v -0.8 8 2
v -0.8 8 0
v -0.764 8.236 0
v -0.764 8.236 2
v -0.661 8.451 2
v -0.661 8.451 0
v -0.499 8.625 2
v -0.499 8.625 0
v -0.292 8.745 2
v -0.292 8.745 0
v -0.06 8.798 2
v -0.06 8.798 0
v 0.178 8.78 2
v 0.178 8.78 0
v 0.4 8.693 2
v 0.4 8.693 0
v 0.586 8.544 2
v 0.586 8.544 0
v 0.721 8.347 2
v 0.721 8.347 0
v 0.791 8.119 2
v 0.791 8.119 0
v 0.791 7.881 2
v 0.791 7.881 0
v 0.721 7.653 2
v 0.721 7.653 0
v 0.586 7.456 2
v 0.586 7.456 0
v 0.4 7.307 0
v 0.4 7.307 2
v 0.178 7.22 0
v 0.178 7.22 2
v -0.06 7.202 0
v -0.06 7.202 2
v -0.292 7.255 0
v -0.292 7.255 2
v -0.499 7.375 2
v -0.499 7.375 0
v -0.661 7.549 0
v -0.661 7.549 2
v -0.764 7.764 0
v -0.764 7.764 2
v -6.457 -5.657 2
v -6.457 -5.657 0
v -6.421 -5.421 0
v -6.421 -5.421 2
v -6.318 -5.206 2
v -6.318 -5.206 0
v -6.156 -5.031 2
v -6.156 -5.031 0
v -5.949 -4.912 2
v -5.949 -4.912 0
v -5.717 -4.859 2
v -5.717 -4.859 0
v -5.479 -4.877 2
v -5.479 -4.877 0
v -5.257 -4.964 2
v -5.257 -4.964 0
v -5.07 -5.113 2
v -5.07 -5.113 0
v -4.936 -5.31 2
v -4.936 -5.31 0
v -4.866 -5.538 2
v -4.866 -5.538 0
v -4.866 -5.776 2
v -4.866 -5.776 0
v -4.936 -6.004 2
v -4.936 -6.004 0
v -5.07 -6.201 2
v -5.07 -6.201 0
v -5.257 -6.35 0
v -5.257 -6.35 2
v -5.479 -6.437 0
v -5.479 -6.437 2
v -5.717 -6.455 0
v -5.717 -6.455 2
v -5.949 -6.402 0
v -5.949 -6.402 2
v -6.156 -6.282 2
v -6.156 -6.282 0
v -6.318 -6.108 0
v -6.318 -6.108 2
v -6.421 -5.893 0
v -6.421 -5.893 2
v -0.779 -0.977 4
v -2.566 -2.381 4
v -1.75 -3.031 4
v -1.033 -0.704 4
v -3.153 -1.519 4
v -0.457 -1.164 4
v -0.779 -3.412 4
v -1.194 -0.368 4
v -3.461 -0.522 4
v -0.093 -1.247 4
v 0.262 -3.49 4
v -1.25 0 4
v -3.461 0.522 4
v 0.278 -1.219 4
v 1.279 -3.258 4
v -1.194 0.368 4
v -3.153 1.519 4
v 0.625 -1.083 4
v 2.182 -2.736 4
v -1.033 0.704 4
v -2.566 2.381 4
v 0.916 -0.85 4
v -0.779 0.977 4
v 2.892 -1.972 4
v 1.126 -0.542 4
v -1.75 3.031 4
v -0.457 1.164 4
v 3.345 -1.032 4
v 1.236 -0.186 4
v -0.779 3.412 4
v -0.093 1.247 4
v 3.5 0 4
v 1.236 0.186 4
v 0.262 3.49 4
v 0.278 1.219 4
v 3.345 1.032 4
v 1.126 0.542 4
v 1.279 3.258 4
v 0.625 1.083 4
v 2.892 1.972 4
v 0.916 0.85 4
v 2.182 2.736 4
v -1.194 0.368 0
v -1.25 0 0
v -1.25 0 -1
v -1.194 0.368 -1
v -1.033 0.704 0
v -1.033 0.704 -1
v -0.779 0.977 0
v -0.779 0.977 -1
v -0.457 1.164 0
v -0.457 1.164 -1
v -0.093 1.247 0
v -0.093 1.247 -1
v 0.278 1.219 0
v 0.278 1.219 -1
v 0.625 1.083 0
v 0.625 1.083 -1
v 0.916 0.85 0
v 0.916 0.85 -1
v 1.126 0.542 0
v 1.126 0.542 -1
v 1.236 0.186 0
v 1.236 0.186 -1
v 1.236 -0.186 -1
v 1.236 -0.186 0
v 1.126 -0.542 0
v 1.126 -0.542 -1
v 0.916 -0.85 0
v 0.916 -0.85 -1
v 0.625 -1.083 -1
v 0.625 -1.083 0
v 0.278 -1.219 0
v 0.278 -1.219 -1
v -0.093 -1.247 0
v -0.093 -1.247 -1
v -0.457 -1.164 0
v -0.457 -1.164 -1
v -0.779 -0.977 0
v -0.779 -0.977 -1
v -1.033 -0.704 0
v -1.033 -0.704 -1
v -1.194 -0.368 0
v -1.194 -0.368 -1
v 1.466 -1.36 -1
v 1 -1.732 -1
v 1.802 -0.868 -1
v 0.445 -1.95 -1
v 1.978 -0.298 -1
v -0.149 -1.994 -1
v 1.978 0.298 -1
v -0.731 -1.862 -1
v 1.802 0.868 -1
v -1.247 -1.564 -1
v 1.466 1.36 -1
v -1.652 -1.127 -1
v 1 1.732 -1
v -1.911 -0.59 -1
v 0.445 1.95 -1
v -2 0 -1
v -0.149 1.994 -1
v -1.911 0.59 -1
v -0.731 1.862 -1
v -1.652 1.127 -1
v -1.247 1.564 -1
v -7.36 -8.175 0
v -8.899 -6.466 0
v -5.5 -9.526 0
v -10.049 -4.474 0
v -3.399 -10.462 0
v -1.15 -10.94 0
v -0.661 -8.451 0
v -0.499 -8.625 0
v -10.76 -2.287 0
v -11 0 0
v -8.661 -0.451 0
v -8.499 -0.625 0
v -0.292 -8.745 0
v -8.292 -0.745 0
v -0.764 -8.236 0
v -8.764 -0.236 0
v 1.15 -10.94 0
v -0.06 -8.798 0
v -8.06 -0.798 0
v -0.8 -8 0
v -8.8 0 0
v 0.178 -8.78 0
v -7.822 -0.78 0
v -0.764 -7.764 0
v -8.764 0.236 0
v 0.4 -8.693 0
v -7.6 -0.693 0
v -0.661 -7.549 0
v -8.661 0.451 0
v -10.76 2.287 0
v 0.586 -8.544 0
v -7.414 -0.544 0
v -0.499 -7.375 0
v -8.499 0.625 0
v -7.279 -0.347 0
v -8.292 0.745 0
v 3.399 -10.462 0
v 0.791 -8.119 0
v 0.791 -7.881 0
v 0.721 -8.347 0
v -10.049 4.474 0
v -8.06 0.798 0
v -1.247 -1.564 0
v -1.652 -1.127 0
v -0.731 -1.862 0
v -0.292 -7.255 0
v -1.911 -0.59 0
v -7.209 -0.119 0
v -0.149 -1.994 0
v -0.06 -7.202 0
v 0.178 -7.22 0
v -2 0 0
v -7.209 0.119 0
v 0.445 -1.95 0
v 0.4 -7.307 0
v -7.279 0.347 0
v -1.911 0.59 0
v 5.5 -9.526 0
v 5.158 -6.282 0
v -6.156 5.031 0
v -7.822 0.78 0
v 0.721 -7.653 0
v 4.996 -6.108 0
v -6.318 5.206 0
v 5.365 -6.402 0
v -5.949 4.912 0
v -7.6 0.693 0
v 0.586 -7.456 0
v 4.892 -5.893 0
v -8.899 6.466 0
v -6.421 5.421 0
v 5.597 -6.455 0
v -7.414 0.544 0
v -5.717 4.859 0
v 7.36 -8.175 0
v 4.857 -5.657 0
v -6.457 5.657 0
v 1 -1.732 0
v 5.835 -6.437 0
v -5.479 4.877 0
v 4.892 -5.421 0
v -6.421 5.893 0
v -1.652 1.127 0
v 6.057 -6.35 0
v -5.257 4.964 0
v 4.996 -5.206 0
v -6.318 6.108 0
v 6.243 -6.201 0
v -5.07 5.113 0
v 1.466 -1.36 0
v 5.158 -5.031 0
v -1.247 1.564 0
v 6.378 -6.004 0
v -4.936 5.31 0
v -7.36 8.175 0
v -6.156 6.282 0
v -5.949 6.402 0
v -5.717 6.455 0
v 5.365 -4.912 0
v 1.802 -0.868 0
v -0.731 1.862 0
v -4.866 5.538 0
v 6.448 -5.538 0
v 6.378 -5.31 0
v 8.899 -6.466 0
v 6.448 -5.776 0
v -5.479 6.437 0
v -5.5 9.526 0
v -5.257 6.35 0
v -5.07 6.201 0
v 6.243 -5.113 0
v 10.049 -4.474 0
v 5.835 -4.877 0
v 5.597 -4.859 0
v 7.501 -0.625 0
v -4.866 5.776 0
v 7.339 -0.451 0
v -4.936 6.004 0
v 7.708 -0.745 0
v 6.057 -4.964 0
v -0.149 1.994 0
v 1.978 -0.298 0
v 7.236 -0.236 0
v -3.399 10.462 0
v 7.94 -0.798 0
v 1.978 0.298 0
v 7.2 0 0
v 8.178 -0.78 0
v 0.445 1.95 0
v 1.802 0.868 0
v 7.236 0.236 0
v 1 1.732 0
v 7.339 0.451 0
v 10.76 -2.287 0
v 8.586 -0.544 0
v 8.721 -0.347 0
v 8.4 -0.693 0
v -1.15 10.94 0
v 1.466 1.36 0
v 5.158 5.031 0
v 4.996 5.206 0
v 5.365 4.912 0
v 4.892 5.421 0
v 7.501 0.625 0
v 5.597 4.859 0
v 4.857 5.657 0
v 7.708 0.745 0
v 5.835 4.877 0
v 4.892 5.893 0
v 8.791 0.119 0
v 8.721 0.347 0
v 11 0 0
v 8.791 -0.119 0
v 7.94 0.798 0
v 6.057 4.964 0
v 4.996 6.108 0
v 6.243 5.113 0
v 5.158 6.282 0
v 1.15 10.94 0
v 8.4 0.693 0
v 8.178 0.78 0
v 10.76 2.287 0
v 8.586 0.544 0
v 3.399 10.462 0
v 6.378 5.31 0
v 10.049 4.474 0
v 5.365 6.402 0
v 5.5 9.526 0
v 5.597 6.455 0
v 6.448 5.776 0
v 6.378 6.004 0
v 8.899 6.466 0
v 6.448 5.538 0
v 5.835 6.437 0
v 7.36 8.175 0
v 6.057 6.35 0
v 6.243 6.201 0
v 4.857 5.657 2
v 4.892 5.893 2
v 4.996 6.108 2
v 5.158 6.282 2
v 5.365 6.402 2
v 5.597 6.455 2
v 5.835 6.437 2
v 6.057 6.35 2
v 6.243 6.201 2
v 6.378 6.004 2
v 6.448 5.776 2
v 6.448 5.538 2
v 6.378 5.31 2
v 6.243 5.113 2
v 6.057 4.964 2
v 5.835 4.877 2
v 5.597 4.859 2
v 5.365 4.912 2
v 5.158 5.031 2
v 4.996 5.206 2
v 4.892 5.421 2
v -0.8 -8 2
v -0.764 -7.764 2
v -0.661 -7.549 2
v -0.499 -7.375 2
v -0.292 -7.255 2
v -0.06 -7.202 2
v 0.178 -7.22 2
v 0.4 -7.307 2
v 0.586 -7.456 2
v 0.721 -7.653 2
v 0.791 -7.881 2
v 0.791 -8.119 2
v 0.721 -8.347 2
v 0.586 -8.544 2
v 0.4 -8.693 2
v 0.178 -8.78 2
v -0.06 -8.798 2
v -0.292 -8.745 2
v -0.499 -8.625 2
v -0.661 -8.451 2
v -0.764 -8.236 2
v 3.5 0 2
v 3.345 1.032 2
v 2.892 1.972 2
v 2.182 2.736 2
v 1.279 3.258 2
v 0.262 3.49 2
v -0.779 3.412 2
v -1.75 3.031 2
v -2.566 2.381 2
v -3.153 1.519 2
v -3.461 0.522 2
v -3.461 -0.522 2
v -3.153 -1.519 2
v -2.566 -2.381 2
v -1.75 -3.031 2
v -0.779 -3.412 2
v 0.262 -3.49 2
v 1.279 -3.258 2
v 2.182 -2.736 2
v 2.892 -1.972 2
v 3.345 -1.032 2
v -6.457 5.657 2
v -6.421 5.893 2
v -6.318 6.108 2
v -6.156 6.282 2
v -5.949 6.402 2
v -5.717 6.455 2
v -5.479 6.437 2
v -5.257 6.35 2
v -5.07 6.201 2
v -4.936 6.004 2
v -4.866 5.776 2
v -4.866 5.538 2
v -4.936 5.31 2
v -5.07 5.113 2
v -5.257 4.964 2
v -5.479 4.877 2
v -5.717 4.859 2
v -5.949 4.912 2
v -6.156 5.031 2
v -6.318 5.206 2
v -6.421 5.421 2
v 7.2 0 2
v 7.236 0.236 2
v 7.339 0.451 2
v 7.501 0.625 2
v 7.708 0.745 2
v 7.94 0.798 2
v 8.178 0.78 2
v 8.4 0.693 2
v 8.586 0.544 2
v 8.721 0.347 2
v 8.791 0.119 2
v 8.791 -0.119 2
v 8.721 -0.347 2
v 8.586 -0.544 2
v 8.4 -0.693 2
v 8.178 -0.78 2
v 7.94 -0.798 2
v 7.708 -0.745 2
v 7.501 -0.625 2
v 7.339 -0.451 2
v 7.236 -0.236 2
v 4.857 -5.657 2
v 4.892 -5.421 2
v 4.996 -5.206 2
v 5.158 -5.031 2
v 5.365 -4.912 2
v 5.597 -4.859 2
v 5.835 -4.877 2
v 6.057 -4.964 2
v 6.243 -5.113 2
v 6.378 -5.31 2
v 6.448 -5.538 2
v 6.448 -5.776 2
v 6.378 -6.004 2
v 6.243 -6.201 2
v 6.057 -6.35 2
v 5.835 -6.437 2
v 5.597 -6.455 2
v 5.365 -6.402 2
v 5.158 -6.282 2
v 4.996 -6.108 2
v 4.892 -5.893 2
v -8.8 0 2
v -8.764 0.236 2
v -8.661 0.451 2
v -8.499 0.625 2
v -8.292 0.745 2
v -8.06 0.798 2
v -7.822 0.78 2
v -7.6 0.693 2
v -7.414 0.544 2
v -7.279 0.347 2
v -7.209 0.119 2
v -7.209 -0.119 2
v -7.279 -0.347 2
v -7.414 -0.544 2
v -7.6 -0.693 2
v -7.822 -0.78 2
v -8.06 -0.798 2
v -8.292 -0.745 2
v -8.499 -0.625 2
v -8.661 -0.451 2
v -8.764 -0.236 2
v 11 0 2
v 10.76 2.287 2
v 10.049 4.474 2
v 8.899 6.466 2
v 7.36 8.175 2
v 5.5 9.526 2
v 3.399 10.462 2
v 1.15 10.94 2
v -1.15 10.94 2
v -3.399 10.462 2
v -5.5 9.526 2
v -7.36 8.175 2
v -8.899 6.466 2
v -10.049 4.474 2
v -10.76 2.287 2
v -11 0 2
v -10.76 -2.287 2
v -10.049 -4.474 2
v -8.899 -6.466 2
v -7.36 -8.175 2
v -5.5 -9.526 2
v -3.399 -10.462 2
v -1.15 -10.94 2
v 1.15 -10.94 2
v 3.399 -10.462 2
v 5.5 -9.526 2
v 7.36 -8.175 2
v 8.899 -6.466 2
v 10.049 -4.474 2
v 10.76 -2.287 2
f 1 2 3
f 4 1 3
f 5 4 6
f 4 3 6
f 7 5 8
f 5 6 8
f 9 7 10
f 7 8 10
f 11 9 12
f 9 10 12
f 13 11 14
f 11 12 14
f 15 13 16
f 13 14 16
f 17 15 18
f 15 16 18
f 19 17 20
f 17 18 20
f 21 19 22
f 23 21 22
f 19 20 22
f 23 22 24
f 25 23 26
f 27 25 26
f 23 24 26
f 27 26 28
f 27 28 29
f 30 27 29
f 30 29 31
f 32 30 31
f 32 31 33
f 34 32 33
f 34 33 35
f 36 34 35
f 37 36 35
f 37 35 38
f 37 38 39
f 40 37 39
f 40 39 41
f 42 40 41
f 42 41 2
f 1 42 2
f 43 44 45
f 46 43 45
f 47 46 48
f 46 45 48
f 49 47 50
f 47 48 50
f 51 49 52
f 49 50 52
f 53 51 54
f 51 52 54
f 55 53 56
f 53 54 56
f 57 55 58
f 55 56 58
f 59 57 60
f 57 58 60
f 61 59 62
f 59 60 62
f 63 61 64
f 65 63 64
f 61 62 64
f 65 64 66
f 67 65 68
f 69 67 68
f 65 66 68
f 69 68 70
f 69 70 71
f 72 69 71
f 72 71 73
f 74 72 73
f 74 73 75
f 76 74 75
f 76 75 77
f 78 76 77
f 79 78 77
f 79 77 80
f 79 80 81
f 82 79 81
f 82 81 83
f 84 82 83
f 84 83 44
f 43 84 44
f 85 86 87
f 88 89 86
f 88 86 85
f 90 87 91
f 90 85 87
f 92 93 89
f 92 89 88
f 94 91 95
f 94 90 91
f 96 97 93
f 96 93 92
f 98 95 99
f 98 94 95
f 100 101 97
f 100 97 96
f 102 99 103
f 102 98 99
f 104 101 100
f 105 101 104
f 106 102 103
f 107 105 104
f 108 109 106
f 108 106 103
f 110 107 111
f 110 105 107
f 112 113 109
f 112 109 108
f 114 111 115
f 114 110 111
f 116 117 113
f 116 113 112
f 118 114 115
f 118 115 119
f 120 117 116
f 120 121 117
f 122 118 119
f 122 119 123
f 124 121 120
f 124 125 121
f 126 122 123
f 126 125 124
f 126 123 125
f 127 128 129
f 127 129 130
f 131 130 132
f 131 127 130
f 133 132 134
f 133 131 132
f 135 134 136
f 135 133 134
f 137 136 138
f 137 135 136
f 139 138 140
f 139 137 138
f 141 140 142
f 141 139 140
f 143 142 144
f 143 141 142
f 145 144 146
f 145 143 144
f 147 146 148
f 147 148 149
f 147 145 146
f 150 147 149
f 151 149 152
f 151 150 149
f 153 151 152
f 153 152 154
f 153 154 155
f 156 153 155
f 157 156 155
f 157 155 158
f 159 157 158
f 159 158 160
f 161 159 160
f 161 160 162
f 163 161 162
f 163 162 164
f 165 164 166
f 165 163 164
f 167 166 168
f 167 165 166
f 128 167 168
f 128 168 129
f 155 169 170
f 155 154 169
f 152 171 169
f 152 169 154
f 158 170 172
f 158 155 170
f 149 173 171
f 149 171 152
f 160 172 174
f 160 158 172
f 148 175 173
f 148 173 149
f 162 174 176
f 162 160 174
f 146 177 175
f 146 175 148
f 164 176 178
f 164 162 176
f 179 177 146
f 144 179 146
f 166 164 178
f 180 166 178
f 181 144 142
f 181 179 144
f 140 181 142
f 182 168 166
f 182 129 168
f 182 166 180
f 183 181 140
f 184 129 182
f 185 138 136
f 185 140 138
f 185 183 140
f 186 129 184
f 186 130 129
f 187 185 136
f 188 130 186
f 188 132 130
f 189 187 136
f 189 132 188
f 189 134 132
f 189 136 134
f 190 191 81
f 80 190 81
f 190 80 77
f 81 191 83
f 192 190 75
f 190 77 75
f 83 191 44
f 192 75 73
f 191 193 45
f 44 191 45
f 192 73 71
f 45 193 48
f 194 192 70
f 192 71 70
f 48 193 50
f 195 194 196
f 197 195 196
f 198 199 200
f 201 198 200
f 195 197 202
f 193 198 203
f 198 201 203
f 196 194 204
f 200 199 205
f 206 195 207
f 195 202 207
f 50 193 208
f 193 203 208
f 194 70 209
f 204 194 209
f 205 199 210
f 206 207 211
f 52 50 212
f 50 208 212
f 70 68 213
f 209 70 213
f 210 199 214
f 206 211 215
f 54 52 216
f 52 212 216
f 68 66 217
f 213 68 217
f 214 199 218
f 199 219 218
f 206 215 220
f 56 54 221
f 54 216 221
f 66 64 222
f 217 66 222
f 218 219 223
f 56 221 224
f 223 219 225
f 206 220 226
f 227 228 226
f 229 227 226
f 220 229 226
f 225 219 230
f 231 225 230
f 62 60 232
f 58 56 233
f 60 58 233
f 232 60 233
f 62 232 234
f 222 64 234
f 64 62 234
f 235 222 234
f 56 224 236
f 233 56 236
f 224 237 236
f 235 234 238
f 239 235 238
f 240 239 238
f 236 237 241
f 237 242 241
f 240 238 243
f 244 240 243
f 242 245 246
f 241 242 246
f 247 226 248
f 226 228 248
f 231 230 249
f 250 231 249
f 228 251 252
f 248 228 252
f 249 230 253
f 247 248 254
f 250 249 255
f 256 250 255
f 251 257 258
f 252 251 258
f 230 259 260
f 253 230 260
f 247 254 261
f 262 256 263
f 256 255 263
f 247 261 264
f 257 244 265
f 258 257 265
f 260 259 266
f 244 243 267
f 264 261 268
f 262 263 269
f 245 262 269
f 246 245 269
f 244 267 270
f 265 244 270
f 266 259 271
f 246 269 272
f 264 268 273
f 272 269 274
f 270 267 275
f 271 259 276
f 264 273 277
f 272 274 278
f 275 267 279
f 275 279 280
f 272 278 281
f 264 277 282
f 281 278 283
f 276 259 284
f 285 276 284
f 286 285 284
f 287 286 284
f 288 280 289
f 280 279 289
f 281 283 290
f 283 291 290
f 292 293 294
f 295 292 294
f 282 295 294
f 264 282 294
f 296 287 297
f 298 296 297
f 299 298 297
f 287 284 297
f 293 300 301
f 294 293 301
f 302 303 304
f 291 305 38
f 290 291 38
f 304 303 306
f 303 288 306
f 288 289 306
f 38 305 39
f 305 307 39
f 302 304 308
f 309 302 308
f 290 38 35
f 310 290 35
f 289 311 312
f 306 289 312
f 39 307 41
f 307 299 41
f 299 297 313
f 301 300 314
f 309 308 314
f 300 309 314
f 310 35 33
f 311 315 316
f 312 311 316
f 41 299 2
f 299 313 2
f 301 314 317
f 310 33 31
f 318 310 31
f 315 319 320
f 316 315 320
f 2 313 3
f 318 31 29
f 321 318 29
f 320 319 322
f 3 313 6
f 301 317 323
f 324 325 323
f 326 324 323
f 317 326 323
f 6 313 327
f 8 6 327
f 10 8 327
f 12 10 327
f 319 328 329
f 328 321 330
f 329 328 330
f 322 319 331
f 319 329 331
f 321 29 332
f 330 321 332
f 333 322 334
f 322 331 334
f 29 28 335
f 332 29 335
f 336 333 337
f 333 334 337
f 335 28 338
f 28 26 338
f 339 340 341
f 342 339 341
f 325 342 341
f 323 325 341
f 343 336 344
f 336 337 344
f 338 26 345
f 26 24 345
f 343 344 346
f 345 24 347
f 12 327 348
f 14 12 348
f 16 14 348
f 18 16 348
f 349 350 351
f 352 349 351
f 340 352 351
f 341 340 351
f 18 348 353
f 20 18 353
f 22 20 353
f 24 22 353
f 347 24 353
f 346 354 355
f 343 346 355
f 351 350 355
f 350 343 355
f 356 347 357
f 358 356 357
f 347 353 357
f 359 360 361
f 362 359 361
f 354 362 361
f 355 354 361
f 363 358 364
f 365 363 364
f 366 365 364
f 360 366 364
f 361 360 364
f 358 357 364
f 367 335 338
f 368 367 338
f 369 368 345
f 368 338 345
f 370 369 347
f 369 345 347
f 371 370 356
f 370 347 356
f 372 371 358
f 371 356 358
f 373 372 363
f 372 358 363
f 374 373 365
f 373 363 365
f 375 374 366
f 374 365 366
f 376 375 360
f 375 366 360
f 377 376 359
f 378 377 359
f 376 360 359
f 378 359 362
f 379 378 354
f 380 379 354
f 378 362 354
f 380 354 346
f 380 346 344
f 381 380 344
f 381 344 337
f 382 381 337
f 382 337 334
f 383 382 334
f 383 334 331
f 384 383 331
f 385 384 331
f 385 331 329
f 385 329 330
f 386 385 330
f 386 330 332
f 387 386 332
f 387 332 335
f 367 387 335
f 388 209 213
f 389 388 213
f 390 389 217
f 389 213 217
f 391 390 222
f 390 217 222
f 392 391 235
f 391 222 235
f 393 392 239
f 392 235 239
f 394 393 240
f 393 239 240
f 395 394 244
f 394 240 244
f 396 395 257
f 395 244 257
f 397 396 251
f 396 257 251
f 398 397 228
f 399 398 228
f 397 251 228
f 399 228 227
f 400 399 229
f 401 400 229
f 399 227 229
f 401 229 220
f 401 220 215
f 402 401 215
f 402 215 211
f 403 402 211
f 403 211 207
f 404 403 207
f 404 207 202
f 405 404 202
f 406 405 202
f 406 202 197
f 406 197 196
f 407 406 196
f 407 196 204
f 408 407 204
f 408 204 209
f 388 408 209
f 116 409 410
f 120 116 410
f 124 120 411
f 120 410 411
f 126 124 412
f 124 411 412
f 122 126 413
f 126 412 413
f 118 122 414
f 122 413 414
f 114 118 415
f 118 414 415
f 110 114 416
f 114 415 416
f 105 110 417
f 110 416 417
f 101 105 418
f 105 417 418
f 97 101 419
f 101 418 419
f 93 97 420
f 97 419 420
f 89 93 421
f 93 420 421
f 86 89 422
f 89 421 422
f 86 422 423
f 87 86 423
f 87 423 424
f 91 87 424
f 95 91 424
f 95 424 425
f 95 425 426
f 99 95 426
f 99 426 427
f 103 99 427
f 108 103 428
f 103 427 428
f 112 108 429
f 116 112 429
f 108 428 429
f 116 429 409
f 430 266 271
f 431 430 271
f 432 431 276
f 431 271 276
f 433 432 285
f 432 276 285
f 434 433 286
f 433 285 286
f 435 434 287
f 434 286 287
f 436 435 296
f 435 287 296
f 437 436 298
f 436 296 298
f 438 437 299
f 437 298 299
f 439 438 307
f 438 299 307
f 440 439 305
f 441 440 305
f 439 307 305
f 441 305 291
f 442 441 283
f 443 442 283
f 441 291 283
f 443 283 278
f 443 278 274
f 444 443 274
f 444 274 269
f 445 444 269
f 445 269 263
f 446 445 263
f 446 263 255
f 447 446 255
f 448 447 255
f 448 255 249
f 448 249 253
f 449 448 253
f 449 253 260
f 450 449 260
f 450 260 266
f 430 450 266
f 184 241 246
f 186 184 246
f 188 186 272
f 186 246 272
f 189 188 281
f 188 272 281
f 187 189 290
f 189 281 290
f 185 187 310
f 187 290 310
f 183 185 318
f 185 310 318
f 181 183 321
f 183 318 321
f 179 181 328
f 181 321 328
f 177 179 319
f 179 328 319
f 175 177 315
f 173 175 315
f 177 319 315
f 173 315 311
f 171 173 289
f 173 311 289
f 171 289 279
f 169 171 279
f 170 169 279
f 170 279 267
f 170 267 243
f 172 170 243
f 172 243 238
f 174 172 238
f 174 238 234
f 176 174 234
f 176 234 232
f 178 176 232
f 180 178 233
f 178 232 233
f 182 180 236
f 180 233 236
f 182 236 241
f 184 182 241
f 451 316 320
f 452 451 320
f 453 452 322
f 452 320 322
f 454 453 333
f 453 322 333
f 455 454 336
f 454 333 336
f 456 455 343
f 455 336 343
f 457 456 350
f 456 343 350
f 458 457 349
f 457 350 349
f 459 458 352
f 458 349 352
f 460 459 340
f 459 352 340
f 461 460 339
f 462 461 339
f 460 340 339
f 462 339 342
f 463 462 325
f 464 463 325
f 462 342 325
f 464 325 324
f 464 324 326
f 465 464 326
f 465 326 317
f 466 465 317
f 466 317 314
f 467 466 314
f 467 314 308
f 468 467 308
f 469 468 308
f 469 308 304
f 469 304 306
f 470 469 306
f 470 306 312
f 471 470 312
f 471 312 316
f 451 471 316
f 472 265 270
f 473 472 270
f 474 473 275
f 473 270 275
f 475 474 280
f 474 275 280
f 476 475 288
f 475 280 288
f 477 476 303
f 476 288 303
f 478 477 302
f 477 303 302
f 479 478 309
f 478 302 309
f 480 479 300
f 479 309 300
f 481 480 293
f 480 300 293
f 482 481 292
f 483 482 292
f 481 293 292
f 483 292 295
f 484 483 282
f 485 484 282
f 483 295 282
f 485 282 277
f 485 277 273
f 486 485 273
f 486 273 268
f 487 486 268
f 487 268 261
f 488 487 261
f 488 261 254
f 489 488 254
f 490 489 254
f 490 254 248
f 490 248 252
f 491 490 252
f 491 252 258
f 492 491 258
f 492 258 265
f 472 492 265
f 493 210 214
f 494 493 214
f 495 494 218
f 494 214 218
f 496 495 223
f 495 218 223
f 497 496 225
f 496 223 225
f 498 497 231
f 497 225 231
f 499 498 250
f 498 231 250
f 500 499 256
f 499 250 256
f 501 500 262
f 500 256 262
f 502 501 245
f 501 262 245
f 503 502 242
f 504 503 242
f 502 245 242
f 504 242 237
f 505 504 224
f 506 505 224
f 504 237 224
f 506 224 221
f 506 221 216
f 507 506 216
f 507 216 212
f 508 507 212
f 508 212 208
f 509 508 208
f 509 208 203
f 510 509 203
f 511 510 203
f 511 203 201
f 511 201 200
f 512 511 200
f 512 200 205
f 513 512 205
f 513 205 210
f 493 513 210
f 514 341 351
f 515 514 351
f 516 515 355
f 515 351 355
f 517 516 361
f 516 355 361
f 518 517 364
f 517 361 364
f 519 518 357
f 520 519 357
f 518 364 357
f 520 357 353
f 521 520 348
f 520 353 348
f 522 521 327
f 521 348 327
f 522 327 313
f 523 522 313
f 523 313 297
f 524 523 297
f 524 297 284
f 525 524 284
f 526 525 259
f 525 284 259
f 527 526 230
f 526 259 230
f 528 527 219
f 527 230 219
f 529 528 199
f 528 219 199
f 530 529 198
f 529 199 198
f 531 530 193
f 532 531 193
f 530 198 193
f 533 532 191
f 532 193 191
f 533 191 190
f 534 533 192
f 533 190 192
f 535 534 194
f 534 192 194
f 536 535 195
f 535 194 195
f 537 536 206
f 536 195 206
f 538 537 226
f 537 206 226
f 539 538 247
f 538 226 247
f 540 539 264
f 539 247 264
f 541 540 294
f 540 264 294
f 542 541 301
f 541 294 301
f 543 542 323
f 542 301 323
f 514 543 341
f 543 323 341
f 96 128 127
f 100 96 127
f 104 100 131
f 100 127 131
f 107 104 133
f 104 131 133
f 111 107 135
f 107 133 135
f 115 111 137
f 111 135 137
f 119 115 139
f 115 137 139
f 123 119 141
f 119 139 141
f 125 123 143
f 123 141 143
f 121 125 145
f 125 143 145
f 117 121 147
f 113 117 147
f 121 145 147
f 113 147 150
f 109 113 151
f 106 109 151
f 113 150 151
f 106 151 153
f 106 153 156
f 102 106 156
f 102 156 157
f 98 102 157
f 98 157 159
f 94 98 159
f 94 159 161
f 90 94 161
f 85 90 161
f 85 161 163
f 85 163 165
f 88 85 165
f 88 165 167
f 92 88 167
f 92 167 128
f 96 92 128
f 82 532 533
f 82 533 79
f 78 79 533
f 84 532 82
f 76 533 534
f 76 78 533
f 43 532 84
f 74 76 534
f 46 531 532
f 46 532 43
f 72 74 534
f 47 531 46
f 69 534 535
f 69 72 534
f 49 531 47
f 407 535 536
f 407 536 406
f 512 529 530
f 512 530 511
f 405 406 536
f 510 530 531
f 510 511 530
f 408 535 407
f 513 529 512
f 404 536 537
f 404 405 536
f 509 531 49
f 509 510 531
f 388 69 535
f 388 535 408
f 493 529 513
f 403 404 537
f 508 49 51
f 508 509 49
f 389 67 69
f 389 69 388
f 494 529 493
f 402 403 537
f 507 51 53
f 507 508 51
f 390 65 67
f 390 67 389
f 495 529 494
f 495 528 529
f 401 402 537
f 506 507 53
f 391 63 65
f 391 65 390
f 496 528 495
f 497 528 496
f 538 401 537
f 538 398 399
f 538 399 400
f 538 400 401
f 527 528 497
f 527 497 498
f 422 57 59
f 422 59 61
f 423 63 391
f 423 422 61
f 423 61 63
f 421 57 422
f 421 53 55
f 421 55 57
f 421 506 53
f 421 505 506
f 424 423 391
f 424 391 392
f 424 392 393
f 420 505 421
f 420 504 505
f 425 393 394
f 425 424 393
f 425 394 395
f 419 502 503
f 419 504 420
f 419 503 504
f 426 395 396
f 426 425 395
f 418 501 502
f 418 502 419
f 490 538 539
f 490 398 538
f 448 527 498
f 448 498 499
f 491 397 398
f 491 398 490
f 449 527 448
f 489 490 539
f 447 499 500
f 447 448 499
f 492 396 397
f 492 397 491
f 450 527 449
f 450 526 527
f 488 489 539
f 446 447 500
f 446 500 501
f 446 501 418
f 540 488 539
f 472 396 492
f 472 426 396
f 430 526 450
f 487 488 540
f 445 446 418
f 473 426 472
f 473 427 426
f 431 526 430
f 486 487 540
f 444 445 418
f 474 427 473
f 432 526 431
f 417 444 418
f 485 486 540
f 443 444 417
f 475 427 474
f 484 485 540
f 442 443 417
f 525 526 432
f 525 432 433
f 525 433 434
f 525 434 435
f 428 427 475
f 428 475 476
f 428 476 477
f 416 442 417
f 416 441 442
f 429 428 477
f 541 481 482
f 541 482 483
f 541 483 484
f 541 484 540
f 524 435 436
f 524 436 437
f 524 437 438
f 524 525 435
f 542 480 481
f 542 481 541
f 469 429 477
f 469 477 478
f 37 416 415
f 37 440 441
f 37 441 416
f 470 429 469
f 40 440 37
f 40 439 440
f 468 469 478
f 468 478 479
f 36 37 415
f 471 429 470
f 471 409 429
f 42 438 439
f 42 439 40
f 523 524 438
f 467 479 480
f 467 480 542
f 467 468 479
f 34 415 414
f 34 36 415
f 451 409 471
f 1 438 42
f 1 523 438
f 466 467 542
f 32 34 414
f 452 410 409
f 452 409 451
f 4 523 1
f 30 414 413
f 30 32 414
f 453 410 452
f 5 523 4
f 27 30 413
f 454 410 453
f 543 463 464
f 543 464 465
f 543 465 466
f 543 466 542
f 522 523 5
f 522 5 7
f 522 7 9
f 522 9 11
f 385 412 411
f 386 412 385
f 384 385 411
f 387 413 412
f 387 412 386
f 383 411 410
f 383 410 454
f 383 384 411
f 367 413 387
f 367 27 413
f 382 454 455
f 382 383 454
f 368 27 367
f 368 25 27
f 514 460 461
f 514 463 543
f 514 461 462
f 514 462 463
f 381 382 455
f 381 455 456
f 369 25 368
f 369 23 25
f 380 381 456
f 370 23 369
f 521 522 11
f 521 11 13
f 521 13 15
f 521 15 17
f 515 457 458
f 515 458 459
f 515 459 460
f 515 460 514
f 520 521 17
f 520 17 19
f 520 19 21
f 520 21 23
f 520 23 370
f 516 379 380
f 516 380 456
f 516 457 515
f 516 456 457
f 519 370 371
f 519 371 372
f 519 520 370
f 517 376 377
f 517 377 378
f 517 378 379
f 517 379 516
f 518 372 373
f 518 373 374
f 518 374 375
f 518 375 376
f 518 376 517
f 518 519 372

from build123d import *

# Parameters (mm, degrees)
SKETCH1_R                 = 11
BOSS_EXTRUDE1_DEPTH       = 2
SKETCH3_R                 = 3.5
BOSS_EXTRUDE2_DEPTH       = 2
M2X0_4_TAPPED_HOLE1_D     = 1.6
M2X0_4_TAPPED_HOLE1_DEPTH = 5.2
M2X0_4_TAPPED_HOLE1_TIP   = 0.480688495
SKETCH8_R                 = 2
SKETCH8_R_2               = 1.25
BOSS_EXTRUDE3_DEPTH       = 1
M3X0_5_TAPPED_HOLE1_D     = 2.5
M3X0_5_TAPPED_HOLE1_DEPTH = 7.5
M3X0_5_TAPPED_HOLE1_TIP   = 0.751075774


with BuildPart() as part:
    # Sketch1 → Boss-Extrude1 (new body)
    with BuildSketch(Plane.XY):
        Circle(SKETCH1_R)
    extrude(amount=BOSS_EXTRUDE1_DEPTH)

    # Sketch3 → Boss-Extrude2 (add)
    with BuildSketch(Plane.XY.offset(2)):
        Circle(SKETCH3_R)
    extrude(amount=BOSS_EXTRUDE2_DEPTH)

    # M2x0.4 Tapped Hole1
    with Locations(Plane.XY.offset(2)):
        with Locations((0, 8), (-5.656854249, 5.656854249), (-8, 0), (-5.656854249, -5.656854249), (0, -8), (5.656854249, -5.656854249), (8, 0), (5.656854249, 5.656854249)):
            Hole(M2X0_4_TAPPED_HOLE1_D / 2, depth=M2X0_4_TAPPED_HOLE1_DEPTH)
            with Locations((0, 0, -(M2X0_4_TAPPED_HOLE1_DEPTH + M2X0_4_TAPPED_HOLE1_TIP / 2))):  # 118° drill point
                Cone(0, M2X0_4_TAPPED_HOLE1_D / 2, M2X0_4_TAPPED_HOLE1_TIP, mode=Mode.SUBTRACT)

    # Sketch8 → Boss-Extrude3 (add)
    with BuildSketch(Plane(origin=(0, 0, 0), x_dir=(-1, 0, 0), z_dir=(0, 0, -1))):
        Circle(SKETCH8_R)
        Circle(SKETCH8_R_2, mode=Mode.SUBTRACT)
    extrude(amount=BOSS_EXTRUDE3_DEPTH)

    # M3x0.5 Tapped Hole1
    with Locations(Plane.XY.offset(4)):
        with Locations((0, 0)):
            Hole(M3X0_5_TAPPED_HOLE1_D / 2, depth=M3X0_5_TAPPED_HOLE1_DEPTH)
            with Locations((0, 0, -(M3X0_5_TAPPED_HOLE1_DEPTH + M3X0_5_TAPPED_HOLE1_TIP / 2))):  # 118° drill point
                Cone(0, M3X0_5_TAPPED_HOLE1_D / 2, M3X0_5_TAPPED_HOLE1_TIP, mode=Mode.SUBTRACT)


solid = part.part
